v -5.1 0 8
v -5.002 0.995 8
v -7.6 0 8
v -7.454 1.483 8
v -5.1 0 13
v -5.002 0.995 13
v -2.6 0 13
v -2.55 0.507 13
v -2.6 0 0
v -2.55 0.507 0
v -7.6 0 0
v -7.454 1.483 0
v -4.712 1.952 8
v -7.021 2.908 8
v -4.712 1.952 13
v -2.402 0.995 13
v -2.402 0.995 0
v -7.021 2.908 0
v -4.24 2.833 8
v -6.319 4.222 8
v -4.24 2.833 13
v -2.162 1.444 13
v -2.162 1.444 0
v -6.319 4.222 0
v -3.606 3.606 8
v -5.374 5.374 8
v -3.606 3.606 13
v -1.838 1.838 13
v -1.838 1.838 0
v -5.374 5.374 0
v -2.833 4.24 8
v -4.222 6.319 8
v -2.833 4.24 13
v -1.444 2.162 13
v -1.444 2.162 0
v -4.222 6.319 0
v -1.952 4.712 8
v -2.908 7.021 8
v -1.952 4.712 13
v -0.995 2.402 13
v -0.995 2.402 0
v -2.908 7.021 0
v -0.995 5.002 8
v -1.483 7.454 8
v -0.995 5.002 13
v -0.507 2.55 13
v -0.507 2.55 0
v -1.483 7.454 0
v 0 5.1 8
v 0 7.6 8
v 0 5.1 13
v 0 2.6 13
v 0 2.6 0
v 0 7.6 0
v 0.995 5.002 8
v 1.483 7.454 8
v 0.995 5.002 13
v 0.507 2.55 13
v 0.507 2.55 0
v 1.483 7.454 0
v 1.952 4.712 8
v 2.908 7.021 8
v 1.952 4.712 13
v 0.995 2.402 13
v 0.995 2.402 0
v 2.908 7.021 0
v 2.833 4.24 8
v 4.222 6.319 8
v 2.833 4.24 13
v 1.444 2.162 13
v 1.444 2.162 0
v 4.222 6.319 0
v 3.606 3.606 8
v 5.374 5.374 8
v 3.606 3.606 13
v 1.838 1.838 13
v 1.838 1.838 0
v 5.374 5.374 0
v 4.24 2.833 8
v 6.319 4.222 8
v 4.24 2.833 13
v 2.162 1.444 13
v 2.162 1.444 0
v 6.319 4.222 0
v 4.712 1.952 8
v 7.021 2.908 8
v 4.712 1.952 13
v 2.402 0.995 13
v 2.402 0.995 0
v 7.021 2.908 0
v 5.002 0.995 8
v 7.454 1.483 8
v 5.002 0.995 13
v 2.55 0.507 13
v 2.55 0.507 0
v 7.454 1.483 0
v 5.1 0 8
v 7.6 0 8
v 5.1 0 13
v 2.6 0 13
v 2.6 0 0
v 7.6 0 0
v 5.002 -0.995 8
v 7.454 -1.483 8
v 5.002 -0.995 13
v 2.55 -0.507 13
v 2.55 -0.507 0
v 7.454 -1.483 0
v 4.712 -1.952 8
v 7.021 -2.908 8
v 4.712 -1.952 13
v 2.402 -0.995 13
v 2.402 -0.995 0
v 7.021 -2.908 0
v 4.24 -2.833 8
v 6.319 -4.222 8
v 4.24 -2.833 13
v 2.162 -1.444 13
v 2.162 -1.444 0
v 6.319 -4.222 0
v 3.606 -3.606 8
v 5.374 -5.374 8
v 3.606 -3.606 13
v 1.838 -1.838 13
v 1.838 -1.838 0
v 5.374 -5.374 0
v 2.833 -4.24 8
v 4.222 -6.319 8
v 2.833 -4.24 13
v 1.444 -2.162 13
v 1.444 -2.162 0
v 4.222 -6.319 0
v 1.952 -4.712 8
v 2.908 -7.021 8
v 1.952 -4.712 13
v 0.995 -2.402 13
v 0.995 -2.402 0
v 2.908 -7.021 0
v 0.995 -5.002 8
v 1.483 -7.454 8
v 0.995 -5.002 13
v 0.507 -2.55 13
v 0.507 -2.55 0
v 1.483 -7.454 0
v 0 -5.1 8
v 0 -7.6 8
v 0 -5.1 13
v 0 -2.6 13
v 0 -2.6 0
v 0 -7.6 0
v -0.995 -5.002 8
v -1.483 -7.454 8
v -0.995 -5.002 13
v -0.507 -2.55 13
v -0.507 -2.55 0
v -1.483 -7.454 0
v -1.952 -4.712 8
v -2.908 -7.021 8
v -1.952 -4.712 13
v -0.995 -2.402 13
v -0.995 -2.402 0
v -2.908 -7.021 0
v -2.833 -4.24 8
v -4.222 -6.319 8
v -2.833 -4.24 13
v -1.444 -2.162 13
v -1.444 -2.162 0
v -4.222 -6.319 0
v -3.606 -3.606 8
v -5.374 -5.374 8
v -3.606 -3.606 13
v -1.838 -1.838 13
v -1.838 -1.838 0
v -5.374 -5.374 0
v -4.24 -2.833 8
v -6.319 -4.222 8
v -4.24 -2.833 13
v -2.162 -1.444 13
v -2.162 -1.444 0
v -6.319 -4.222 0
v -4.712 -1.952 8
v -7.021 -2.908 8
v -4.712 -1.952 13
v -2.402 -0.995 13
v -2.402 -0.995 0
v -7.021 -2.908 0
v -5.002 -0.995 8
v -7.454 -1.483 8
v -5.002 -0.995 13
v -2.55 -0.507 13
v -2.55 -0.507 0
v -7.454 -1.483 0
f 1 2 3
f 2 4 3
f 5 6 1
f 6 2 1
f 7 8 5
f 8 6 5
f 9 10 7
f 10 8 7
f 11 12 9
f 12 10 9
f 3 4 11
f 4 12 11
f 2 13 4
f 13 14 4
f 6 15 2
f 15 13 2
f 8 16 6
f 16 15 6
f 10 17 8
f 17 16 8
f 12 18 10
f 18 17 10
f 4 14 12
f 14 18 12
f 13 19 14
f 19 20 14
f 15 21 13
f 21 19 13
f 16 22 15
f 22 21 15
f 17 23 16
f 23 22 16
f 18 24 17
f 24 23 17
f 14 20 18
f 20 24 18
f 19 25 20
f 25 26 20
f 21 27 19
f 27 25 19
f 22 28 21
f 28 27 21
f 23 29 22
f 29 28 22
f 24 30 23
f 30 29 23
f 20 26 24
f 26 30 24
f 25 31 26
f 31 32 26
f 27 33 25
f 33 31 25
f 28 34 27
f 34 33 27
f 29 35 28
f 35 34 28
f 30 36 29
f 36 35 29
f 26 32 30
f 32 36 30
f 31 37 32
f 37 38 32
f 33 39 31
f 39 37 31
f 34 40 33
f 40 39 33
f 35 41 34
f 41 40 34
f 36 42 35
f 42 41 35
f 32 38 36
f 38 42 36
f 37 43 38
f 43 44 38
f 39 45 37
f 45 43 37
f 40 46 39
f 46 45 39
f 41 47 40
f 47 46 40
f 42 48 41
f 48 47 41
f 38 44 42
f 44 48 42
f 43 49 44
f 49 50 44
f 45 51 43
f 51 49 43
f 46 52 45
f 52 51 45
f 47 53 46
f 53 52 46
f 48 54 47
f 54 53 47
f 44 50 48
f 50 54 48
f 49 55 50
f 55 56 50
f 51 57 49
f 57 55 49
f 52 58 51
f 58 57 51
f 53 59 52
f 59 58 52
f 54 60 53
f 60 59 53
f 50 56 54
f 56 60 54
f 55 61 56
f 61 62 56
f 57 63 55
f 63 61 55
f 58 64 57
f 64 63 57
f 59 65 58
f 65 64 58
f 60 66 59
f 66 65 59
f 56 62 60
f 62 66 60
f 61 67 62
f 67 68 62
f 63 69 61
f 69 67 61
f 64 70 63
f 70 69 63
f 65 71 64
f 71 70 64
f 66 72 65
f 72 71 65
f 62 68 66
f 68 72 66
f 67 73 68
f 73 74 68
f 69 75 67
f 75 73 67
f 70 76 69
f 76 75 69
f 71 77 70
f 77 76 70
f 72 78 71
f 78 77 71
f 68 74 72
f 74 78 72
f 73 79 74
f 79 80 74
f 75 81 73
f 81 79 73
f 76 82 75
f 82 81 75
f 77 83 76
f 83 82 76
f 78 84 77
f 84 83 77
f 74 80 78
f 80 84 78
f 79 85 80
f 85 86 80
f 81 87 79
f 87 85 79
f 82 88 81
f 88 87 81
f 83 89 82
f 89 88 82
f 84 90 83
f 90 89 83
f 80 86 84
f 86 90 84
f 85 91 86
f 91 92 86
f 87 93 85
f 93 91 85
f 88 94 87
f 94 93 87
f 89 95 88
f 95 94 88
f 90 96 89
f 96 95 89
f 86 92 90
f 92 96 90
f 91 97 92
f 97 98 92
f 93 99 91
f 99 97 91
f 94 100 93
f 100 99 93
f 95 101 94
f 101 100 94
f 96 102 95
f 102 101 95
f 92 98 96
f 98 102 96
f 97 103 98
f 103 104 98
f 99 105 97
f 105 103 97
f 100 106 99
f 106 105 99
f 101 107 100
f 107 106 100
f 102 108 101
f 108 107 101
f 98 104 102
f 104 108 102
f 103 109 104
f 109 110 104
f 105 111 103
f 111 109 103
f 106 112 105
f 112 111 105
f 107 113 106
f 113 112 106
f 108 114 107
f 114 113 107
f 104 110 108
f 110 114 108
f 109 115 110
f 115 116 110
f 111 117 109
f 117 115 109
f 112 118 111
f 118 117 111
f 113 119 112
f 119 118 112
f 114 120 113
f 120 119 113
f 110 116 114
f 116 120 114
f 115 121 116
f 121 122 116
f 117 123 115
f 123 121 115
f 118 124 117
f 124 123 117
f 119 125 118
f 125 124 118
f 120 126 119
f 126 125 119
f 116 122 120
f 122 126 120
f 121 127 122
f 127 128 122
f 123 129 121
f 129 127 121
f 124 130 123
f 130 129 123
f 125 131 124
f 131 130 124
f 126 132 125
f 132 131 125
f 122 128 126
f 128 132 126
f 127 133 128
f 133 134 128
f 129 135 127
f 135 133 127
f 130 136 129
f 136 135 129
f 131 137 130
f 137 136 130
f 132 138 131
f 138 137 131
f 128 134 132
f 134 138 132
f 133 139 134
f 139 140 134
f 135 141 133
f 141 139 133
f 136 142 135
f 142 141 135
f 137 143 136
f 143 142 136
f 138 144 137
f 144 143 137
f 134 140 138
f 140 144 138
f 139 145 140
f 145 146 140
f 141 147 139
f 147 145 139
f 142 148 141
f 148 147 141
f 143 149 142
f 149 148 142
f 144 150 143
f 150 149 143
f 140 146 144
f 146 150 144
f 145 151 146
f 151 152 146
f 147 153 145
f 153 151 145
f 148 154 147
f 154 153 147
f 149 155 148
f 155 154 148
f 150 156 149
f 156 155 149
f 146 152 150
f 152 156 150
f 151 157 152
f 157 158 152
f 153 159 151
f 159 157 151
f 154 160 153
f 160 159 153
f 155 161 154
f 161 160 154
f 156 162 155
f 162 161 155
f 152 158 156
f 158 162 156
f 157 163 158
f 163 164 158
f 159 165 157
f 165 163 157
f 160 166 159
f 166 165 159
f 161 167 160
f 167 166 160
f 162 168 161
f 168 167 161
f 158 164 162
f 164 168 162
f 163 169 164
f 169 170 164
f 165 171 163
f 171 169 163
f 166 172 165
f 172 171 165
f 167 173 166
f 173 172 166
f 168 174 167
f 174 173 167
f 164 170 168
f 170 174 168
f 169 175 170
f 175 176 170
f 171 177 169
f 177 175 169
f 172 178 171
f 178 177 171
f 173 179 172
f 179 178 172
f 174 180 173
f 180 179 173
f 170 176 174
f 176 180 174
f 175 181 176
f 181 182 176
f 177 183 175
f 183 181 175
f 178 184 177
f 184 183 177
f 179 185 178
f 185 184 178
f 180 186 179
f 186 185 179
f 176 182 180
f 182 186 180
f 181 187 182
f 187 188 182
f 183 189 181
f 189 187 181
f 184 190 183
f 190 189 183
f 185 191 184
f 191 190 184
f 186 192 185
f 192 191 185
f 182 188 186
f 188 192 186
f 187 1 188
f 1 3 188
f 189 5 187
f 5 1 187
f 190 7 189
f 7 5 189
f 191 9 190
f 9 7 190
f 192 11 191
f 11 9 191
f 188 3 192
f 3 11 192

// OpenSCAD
$fn = 32;

// ----------------------------------------------------------------------
// Form washer: stepped_c washer, 15.2 mm outside, 5.2 mm bore
// ----------------------------------------------------------------------

// --- parameters (mm) ---
revolve_angle = 360;      // full turn around the Z axis
profile_points = 6;       // points of the closed outline

profile = [[2.6, 0], [7.6, 0], [7.6, 8], [5.1, 8], [5.1, 13], [2.6, 13]];  // single closed polygon, 6 points, counter clockwise

// --- the one profile operation ---
rotate_extrude(angle = revolve_angle) polygon(points = profile);
